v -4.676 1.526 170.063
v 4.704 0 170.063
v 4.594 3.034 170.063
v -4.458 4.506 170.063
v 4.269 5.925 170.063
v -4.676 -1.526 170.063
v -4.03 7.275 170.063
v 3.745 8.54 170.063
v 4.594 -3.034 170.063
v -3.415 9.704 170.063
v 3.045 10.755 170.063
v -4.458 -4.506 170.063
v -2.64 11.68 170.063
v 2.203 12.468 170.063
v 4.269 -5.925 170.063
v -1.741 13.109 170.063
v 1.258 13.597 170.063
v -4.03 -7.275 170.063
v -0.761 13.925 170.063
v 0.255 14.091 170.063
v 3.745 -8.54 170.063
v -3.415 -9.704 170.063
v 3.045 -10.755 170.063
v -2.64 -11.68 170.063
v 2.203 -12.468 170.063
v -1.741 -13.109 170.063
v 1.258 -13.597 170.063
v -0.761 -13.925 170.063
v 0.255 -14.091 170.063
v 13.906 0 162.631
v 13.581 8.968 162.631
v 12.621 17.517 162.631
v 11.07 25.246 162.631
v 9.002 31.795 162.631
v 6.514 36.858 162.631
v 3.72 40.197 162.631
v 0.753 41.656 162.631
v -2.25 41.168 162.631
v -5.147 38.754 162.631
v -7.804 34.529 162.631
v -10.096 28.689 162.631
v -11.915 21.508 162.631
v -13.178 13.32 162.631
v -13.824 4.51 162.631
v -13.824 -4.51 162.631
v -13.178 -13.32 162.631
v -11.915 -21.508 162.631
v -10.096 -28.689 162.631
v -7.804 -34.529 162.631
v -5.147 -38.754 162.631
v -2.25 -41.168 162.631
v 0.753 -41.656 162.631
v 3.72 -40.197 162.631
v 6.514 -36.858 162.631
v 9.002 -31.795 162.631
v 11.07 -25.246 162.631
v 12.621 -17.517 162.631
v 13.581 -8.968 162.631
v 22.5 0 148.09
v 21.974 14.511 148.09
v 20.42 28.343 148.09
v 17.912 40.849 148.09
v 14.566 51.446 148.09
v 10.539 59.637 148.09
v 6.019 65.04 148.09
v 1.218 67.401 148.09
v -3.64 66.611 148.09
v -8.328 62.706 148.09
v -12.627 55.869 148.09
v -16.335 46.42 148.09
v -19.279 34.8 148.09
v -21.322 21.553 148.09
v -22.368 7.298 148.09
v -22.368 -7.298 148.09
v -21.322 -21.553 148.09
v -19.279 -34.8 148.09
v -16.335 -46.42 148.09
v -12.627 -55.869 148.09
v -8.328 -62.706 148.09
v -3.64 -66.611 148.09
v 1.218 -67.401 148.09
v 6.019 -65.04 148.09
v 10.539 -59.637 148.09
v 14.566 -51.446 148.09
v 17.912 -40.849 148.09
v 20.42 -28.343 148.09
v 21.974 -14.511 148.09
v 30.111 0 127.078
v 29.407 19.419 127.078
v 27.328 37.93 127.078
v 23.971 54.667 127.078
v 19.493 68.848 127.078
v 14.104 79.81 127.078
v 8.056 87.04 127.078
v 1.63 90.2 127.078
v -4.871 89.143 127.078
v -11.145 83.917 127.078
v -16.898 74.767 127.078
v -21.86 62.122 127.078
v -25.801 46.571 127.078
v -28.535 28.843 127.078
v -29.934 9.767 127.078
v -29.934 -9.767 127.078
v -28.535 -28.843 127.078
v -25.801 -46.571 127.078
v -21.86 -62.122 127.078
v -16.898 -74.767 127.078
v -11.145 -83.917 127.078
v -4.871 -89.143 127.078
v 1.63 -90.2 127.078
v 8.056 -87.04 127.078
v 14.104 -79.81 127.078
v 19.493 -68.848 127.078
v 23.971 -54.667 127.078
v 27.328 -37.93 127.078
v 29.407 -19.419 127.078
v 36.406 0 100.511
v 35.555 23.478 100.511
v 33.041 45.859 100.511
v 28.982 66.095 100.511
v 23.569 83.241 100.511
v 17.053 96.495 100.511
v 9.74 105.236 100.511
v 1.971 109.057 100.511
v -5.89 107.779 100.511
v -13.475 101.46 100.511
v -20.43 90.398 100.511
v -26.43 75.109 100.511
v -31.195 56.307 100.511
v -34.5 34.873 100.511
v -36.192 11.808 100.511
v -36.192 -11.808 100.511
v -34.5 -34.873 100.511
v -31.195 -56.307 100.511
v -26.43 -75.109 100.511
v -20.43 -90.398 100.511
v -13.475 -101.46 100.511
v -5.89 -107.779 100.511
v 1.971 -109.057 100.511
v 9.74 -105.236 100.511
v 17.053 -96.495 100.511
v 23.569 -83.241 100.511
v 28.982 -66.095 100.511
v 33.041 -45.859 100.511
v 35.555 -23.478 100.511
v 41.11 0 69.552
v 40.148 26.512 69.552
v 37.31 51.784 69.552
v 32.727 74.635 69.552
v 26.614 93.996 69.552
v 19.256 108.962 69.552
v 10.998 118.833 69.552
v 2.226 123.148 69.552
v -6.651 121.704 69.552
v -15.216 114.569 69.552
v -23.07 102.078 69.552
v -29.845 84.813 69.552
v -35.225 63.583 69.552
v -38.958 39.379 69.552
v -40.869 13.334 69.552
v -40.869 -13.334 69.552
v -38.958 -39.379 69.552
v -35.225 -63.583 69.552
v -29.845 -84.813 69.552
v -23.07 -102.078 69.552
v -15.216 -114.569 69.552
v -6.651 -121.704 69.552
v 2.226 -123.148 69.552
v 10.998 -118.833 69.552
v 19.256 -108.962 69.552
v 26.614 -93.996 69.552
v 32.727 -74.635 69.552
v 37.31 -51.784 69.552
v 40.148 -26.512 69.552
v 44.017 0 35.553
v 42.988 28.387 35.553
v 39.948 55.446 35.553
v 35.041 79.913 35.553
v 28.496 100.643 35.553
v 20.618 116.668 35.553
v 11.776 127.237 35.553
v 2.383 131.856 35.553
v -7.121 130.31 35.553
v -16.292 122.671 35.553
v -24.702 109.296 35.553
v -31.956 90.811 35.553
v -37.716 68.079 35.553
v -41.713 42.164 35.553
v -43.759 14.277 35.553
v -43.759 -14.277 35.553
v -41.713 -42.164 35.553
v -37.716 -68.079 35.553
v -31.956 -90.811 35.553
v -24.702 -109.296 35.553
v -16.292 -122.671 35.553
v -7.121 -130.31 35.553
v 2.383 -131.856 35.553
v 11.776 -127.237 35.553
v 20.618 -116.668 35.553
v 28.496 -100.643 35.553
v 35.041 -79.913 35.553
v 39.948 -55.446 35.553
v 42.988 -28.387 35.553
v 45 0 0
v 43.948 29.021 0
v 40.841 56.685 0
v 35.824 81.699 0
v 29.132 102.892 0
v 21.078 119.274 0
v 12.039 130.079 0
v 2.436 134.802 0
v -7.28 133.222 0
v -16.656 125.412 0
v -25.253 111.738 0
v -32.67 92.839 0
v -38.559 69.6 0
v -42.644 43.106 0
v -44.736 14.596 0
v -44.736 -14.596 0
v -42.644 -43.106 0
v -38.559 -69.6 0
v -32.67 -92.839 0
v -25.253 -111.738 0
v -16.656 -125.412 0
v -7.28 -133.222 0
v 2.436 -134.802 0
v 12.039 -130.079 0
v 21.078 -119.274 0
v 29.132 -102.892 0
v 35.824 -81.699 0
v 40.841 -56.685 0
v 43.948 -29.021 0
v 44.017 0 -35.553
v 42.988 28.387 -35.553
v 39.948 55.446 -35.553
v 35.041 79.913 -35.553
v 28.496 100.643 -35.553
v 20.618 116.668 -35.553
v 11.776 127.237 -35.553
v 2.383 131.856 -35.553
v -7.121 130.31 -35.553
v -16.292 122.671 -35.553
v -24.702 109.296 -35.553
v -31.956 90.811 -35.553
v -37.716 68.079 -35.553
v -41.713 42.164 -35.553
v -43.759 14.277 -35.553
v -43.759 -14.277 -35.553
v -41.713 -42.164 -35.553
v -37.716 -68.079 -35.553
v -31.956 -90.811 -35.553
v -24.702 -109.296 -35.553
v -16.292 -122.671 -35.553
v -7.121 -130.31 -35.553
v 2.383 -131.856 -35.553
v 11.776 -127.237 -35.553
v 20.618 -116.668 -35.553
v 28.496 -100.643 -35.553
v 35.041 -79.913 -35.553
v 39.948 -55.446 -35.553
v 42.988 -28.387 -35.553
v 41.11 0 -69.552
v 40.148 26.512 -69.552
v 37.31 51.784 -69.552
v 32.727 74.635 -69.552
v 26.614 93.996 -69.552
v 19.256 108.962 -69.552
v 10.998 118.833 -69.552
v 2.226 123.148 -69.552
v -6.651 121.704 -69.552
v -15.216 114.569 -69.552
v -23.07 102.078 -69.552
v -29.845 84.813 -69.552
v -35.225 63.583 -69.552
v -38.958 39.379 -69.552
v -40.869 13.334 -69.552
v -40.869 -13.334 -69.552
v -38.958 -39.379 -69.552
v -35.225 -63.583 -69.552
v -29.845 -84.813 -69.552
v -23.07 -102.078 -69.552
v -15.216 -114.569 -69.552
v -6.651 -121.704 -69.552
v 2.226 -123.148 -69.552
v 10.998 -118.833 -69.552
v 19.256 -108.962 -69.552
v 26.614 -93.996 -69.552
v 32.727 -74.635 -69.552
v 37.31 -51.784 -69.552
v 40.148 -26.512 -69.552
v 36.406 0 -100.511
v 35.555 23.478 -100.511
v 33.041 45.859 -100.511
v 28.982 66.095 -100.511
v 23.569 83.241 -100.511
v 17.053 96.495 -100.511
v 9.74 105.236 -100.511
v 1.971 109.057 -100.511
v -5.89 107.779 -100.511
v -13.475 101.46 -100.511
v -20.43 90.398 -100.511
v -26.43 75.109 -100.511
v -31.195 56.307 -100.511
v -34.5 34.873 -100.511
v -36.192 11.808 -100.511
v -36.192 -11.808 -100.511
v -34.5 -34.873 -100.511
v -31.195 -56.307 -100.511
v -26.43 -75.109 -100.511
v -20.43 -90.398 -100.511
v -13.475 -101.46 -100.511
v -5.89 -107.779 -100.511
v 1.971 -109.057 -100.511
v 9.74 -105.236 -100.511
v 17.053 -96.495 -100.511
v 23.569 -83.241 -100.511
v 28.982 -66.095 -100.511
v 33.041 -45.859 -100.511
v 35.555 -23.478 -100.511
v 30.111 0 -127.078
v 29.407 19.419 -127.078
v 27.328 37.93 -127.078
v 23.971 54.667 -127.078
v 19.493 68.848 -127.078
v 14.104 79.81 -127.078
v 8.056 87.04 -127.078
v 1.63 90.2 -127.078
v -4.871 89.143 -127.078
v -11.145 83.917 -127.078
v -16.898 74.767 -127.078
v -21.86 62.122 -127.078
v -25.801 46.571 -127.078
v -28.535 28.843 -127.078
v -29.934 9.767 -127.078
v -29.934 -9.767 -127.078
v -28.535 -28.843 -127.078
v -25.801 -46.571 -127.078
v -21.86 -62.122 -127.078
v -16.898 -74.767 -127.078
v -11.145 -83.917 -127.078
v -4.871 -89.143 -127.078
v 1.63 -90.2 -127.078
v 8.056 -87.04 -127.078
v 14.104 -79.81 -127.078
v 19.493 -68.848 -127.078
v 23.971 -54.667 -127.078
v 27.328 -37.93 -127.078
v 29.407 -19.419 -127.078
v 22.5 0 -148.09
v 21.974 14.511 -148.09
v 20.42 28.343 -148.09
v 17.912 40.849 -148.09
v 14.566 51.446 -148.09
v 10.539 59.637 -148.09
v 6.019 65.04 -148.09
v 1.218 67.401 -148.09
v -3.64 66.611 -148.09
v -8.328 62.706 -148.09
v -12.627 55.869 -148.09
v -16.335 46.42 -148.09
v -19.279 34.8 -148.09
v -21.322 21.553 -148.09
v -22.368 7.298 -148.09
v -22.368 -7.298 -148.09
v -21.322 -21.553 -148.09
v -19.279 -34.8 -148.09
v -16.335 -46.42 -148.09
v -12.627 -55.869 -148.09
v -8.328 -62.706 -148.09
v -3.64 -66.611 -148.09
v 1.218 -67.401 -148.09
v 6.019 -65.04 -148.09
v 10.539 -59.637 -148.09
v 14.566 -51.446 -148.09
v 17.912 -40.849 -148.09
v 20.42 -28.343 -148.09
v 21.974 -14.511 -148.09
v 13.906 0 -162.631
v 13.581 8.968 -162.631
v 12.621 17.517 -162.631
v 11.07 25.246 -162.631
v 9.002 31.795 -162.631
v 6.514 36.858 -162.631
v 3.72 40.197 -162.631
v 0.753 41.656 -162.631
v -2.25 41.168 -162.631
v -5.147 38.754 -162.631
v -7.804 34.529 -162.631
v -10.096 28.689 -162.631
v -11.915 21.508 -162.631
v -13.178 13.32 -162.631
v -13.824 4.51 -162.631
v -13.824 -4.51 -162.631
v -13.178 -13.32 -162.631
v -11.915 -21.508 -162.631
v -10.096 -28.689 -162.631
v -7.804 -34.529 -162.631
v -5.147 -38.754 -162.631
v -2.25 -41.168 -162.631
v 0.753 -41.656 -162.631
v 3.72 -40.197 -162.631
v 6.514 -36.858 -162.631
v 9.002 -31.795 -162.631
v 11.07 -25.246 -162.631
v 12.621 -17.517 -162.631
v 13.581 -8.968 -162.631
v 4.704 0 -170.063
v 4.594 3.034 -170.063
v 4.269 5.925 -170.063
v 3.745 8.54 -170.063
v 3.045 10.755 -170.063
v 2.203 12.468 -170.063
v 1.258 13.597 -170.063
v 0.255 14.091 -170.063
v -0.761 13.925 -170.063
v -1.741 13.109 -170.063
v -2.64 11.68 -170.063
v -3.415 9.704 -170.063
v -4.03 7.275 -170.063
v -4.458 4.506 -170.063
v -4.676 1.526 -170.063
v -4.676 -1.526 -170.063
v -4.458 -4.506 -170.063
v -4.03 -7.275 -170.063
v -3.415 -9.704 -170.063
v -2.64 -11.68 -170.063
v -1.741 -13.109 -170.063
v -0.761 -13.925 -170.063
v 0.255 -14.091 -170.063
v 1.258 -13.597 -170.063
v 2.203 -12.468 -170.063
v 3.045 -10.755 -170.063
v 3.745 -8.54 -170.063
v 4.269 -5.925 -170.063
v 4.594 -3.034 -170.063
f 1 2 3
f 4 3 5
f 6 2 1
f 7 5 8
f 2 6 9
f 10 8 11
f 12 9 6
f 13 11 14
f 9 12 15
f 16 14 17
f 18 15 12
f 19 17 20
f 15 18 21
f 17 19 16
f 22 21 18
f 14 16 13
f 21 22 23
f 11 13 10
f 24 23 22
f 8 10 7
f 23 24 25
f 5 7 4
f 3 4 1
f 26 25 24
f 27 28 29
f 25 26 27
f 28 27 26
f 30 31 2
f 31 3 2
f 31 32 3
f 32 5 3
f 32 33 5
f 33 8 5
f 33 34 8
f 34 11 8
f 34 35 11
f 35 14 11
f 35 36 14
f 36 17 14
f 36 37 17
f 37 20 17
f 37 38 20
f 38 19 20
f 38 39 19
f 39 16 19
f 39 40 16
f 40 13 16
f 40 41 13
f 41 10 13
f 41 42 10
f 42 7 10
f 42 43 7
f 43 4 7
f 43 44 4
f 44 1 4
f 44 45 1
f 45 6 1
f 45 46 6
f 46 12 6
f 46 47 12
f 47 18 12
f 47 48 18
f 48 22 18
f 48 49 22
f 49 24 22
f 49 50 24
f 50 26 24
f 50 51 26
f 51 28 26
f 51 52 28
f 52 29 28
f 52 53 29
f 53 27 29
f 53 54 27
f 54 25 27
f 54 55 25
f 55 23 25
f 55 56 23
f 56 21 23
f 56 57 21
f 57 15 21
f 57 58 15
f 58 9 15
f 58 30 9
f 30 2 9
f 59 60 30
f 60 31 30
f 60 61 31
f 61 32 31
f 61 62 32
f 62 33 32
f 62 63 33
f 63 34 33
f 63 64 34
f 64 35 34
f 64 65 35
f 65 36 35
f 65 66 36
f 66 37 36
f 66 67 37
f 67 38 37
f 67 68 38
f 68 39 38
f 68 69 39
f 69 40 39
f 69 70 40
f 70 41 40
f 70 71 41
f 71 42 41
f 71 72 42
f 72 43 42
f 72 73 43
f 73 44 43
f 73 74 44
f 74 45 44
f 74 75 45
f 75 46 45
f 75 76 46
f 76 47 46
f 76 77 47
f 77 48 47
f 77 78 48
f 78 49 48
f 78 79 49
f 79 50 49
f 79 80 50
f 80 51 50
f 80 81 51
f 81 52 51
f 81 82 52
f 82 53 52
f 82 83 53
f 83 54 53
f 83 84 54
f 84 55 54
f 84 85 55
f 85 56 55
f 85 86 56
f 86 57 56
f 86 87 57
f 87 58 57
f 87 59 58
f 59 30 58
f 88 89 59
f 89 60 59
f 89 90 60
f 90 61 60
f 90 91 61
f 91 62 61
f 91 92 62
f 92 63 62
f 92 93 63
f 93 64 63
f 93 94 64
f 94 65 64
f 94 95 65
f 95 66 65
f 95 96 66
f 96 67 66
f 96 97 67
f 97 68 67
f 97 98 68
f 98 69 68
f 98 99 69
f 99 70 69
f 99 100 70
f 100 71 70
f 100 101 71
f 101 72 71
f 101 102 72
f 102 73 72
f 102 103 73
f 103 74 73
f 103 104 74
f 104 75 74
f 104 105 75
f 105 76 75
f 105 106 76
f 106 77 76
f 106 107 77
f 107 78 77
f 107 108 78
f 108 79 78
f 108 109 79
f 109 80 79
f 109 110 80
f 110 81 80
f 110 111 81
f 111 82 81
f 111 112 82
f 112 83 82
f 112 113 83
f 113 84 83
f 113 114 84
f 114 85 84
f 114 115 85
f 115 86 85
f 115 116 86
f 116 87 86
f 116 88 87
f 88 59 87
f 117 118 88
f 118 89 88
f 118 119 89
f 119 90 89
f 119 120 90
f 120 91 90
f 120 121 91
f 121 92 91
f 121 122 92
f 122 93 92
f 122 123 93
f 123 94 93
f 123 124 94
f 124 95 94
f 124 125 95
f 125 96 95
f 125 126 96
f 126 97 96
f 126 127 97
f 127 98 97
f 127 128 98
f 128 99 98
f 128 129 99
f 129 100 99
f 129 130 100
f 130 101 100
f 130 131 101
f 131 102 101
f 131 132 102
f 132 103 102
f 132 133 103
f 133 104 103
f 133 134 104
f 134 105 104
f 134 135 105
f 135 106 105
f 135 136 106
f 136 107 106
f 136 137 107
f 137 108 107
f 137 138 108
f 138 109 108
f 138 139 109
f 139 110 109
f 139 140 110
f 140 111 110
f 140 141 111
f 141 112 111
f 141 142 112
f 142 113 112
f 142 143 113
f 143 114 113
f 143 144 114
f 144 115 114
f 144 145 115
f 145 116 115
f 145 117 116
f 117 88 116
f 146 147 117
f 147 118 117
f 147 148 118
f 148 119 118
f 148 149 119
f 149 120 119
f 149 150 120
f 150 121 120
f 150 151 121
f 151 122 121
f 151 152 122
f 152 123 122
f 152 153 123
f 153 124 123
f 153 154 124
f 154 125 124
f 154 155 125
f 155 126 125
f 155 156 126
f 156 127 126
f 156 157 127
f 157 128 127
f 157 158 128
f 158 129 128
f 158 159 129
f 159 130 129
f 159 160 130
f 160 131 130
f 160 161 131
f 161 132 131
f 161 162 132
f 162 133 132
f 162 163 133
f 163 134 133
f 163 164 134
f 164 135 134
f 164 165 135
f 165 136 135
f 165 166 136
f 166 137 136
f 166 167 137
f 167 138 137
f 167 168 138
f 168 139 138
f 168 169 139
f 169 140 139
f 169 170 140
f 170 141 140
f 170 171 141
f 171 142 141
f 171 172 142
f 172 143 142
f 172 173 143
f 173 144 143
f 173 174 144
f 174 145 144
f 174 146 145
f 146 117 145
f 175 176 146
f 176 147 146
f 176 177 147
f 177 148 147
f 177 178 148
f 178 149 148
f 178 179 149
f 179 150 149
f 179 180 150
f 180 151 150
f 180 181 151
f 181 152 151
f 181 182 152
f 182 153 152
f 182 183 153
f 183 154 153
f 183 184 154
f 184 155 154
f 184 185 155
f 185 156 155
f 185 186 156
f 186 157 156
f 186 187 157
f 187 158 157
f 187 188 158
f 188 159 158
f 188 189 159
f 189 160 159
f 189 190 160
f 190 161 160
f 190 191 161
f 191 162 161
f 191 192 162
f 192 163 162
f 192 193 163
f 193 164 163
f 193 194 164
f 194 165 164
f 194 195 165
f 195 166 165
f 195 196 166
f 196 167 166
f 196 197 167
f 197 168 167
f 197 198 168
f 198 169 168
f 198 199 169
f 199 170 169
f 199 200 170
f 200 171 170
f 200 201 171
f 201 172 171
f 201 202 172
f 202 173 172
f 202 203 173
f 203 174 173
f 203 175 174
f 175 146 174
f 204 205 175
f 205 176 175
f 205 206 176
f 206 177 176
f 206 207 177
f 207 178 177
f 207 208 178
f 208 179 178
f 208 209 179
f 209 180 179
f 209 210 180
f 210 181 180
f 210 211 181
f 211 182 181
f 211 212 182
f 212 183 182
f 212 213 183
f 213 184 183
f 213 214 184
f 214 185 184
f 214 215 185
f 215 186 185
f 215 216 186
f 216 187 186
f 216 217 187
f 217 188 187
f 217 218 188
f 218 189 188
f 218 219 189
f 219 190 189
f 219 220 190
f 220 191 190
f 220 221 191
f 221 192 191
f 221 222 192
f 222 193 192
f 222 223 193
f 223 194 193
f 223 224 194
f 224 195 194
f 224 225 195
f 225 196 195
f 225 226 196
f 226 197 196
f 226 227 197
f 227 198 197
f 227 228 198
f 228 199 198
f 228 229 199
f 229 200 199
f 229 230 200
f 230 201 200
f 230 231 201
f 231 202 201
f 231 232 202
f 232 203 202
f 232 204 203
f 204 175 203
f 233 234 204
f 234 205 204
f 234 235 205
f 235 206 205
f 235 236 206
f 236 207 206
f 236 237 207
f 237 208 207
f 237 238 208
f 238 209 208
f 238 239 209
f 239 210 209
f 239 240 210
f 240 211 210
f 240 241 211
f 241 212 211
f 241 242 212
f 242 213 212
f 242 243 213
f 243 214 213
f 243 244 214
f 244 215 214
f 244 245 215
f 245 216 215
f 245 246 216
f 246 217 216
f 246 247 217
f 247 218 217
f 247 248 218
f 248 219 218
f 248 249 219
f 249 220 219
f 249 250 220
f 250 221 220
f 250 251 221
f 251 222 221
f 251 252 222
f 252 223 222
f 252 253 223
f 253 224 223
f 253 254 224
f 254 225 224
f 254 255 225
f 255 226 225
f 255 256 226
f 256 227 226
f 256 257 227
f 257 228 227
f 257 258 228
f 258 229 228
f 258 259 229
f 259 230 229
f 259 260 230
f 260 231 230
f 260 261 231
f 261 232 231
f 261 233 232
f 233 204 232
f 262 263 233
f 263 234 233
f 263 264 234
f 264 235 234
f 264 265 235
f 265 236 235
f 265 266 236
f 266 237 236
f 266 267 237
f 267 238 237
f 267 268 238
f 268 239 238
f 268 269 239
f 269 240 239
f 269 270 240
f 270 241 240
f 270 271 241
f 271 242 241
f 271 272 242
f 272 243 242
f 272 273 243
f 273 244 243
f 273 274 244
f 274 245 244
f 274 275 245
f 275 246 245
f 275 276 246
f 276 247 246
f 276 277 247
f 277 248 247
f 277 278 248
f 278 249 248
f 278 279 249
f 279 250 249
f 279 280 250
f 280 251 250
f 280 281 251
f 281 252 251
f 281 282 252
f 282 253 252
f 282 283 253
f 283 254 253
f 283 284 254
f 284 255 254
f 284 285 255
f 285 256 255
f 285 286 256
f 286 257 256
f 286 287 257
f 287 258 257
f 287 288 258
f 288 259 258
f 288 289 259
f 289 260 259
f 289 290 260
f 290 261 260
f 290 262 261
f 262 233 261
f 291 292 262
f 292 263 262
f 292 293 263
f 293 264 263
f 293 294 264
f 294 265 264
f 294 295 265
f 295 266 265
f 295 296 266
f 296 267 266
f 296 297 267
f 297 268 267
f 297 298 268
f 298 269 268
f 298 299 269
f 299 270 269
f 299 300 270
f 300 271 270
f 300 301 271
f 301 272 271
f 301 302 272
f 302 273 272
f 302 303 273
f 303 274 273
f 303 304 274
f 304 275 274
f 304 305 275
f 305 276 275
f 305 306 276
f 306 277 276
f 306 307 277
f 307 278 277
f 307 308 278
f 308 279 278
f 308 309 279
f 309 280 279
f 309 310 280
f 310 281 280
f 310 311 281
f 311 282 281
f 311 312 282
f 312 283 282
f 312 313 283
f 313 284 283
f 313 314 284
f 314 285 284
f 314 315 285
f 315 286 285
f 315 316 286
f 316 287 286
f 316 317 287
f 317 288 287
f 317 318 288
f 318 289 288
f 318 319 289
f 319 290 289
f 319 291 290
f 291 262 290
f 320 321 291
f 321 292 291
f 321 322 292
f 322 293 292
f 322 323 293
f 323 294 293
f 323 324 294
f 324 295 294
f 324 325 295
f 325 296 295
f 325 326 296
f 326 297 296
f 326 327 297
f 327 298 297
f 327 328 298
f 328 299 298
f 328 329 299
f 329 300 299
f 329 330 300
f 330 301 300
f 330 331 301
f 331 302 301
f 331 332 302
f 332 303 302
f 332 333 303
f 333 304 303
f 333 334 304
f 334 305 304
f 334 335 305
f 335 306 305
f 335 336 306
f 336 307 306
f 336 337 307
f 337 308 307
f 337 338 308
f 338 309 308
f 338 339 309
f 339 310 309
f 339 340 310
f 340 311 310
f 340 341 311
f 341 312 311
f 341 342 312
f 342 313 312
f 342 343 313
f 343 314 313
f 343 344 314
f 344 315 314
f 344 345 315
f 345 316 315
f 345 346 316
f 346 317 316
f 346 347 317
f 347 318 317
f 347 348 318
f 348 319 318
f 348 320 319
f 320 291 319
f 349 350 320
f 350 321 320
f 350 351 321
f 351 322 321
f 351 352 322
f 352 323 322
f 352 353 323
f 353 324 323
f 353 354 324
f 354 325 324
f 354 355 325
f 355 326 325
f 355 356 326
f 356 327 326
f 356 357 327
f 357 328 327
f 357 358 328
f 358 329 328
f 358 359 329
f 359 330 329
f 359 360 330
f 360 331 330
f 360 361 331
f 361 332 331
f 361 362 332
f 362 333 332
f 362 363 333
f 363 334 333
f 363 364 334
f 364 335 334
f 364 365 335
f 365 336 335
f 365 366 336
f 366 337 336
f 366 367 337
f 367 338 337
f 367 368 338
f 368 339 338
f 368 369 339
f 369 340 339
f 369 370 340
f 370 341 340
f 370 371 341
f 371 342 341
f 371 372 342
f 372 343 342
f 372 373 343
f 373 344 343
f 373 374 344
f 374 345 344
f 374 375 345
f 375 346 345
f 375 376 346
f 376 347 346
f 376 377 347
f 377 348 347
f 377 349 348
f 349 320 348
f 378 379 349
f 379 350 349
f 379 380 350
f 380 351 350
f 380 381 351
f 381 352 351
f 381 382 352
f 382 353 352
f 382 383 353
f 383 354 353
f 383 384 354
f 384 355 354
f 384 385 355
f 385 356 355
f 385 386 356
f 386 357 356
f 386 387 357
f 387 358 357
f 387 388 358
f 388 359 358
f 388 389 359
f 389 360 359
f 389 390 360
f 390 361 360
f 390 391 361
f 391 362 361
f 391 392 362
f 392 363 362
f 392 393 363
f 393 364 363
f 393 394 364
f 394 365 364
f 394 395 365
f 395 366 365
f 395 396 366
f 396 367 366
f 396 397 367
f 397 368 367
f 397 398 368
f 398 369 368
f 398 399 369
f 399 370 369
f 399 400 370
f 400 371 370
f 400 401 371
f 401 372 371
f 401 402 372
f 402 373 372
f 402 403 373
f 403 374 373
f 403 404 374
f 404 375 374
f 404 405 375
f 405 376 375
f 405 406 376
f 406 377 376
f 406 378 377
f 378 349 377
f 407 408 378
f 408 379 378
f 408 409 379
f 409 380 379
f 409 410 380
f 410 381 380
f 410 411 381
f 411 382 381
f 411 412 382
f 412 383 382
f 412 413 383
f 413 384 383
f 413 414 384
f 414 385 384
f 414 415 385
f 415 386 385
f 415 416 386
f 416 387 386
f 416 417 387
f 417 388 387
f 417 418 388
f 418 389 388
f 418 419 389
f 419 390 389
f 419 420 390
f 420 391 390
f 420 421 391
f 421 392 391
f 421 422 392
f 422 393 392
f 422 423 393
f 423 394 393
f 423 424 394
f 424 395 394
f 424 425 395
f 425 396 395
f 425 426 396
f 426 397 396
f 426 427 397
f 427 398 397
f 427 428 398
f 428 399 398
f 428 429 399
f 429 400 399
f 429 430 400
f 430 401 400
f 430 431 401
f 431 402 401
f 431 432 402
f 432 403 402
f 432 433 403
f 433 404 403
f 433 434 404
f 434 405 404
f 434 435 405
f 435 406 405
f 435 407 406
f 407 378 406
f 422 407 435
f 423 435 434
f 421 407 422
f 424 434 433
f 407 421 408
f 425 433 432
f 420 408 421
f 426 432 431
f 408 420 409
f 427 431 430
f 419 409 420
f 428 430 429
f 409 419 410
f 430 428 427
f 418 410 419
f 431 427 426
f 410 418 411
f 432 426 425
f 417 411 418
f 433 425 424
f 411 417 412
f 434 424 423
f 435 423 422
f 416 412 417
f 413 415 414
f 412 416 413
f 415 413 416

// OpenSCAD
// Generated by SolidPython 1.0.1 on 2020-07-29 00:46:46


scale(v = [5, 15, 19]) {
	sphere(r = 9);
}
/***********************************************
*********      SolidPython code:      **********
************************************************
 
# import packages: SolidPython
from solid import *
from solid.utils import *
from itertools import chain, combinations, permutations


class Resize:

    def __init__(self, scad_file):
        self.scad_file = scad_file
        #self.scad_file = import_scad(scad_file)
        # cone/cylinder param:
        self.r1 = 0
        self.r2 = 0
        self.h = 0
        # rectangular prism param:
        self.w = 0
        self.l = 0
        # ellipse param:
        self.r = 0

    # import OpenScad code (file name corresponds to shape)


    # classify shape + parameters
    def assign(self, param1, param2, param3):
        if self.scad_file == 'cone.scad':
            self.r1 = param1
            self.r2 = param2
            self.h = param3
        elif self.scad_file == 'cylinder.scad':
            self.r1 = param1
            self.r2 = param2
            self.h = param3
        elif self.scad_file == 'rectangularPrism.scad':
            self.h = param1
            self.l = param2
            self.w = param3
        else:
            self.r = param1
            self.h = param2

    # resize parameters
    def iterate(self):
        x = range(3, 20, 2)
        i = 1
        if self.scad_file == 'cone.scad':
            tempList = list(permutations(x, 2))
            for temp in tempList:
                param1 = temp[0]
                param2 = temp[1]
                filepath = 'produced_scad_files/' + 'cone' + str(param1) + '_' + str(param2) + '_' + '.scad'
                scad_render_to_file(cylinder(h=param1, r1=param2, r2=0), filepath)

        elif self.scad_file == 'cylinder.scad':
            tempList = list(permutations(x, 3))
            for temp in tempList:
                param1 = temp[0]
                param2 = temp[1]
                filepath = 'produced_scad_files/' + 'cylinder' + str(param1) + '_' + str(param2) + '_' + '.scad'
                scad_render_to_file(cylinder(h=param1, r1=param2, r2=param2), filepath)

        elif self.scad_file == 'rectangularPrism.scad':
            tempList = list(permutations(x, 3))
            for temp in tempList:
                param1 = temp[0]
                param2 = temp[1]
                param3 = temp[2]
                filepath = 'produced_scad_files/' + 'rectangularPrism' + str(param1) + '_' + str(param2) + '_' + str(
                    param3) + '.scad'
                scad_render_to_file(cube(size=(param1, param2, param3)), filepath)

        elif self.scad_file == 'ellipse.scad':
            tempList = list(permutations(x, 4))
            for temp in tempList:
                param1 = temp[0]
                param2 = temp[1]
                param3 = temp[2]
                param4 = temp[3]
                filepath = 'produced_scad_files/' + 'ellipse' + str(param1) + '_' + str(param2) + '_' + str(param3) + '_' + str(param4) + '.scad'
                scad_render_to_file(scale([param1, param2, param3])(sphere(r=param4)), filepath)

    def render_to_scadfile(self):
        scad_render_to_file(scad, 'example.scad') 
 
************************************************/
